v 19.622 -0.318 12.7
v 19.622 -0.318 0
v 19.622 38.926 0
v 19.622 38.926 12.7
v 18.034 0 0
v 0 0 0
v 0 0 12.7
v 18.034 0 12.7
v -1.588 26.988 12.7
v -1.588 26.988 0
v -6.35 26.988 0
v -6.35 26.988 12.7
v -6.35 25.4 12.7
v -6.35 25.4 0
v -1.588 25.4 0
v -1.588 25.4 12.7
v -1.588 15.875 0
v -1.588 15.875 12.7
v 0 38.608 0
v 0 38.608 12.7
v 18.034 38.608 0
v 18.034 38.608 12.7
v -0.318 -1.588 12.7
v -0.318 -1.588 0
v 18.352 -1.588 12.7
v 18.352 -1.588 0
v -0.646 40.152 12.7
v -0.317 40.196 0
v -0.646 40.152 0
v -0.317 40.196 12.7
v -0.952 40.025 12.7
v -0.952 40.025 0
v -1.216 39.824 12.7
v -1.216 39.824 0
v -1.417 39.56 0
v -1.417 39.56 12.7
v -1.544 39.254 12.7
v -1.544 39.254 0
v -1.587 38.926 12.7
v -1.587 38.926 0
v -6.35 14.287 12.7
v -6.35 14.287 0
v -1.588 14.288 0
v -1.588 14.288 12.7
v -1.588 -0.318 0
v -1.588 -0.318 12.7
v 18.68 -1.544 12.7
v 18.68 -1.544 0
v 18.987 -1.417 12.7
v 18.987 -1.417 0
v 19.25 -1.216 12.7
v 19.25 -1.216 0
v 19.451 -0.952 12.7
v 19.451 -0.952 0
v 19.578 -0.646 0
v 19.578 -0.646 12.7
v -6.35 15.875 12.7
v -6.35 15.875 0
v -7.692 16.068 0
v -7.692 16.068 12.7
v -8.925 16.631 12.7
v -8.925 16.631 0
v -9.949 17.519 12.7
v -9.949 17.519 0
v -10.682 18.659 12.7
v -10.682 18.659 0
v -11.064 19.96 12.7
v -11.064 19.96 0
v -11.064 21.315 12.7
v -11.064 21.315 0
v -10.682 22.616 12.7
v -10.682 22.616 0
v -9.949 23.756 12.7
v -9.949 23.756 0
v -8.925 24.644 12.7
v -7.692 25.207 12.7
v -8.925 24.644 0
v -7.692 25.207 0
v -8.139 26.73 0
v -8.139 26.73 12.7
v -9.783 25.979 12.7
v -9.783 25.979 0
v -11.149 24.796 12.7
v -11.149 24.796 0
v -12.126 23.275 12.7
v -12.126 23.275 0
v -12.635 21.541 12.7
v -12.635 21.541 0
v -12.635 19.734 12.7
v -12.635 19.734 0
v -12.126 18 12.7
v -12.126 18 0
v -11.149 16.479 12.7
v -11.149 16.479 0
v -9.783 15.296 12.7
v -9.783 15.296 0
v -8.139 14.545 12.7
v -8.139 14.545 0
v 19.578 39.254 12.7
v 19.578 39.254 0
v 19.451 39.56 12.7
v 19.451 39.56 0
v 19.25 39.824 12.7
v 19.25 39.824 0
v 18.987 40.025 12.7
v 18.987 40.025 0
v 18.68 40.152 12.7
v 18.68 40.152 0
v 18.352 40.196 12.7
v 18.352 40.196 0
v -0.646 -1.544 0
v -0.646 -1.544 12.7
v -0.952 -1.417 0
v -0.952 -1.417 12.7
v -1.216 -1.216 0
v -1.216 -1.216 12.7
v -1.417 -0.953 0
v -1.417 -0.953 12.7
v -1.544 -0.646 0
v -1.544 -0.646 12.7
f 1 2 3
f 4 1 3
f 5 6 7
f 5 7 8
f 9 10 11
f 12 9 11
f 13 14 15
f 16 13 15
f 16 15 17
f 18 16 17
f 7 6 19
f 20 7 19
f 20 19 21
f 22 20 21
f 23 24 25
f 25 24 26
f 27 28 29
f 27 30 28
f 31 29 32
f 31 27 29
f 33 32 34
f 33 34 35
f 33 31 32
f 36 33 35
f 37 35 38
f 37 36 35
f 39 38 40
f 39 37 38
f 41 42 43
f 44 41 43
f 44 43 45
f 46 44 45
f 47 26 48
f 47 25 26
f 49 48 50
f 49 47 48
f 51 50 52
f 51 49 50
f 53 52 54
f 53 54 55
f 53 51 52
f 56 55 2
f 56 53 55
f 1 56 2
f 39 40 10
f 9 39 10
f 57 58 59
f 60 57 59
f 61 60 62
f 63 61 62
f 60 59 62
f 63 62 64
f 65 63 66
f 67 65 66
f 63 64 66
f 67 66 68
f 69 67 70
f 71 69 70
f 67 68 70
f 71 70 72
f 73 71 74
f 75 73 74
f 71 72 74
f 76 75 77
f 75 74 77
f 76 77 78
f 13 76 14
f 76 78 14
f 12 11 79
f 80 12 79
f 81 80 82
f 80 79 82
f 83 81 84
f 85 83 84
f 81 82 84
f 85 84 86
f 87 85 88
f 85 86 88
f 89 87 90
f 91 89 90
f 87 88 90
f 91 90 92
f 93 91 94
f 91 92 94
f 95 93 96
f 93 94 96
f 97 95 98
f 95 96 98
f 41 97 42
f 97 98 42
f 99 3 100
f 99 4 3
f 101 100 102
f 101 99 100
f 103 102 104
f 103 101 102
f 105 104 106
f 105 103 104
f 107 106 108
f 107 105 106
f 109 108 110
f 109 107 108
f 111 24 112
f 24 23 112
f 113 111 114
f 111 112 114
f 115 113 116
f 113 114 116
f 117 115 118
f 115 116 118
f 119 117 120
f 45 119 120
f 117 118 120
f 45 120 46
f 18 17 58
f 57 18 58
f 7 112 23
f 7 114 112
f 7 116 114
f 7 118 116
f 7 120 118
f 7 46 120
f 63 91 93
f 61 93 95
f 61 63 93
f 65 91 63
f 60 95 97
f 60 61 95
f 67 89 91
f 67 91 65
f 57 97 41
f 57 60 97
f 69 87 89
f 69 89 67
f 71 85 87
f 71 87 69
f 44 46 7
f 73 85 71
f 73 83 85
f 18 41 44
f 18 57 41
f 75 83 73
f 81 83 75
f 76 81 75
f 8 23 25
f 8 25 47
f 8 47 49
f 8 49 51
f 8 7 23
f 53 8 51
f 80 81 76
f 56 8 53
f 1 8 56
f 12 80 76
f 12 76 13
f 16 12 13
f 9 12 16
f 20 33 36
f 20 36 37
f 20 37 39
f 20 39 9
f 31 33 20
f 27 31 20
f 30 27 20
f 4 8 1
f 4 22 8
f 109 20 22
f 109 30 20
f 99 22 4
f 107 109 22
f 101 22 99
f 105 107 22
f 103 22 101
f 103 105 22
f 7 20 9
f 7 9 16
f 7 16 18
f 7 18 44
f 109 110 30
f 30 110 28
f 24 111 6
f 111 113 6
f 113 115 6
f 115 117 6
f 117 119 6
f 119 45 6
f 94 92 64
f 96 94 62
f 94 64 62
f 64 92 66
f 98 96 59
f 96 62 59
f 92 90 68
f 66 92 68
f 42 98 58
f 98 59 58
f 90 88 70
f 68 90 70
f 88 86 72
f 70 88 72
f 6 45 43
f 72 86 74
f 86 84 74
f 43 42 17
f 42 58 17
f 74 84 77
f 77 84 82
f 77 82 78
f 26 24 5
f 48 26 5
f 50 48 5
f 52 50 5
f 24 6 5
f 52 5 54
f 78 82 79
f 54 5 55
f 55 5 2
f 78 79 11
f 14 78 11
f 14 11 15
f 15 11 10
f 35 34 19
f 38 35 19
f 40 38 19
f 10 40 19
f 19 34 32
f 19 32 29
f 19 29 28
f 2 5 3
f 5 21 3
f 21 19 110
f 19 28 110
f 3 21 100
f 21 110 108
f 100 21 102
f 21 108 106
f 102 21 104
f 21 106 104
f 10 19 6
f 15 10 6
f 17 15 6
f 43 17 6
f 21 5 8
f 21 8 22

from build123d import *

# Parameters (mm, degrees)
F0_W     = 18.034
F0_H     = 38.608
F1_DEPTH = 12.7
F2_R     = 1.27


with BuildPart() as f1:
    # F0 (on Top) → F1 (new body)
    with BuildSketch(Plane.XY):
        Polygon((-1.5875, 14.2875), (-1.5875, -1.5875), (19.6215, -1.5875), (19.6215, 40.1955), (-1.5875, 40.1955), (-1.5875, 26.9875), (-1.5875, 25.4), (-1.5875, 15.875), align=None)
        with Locations((9.017, 19.304)):
            Rectangle(F0_W, F0_H, mode=Mode.SUBTRACT)
        with BuildLine():
            Line((-6.35, 14.2875), (-1.5875, 14.2875))
            Line((-1.5875, 14.2875), (-1.5875, 15.875))
            Line((-1.5875, 15.875), (-6.35, 15.875))
            ThreePointArc((-6.35, 15.875), (-11.1125, 20.6375), (-6.35, 25.4))
            Line((-6.35, 25.4), (-1.5875, 25.4))
            Line((-1.5875, 25.4), (-1.5875, 26.9875))
            Line((-1.5875, 26.9875), (-6.35, 26.9875))
            ThreePointArc((-6.35, 26.9875), (-12.7, 20.6375), (-6.35, 14.2875))
        make_face()
    extrude(amount=F1_DEPTH)

    # F2
    f2_edges = [f1.edges().sort_by_distance(p)[0] for p in [
        (19.6215, -1.5875, 6.35),
        (-1.5875, -1.5875, 6.35),
        (-1.5875, 40.1955, 6.35),
        (19.6215, 40.1955, 6.35),
    ]]
    fillet(f2_edges, radius=F2_R)


solid = f1.part
